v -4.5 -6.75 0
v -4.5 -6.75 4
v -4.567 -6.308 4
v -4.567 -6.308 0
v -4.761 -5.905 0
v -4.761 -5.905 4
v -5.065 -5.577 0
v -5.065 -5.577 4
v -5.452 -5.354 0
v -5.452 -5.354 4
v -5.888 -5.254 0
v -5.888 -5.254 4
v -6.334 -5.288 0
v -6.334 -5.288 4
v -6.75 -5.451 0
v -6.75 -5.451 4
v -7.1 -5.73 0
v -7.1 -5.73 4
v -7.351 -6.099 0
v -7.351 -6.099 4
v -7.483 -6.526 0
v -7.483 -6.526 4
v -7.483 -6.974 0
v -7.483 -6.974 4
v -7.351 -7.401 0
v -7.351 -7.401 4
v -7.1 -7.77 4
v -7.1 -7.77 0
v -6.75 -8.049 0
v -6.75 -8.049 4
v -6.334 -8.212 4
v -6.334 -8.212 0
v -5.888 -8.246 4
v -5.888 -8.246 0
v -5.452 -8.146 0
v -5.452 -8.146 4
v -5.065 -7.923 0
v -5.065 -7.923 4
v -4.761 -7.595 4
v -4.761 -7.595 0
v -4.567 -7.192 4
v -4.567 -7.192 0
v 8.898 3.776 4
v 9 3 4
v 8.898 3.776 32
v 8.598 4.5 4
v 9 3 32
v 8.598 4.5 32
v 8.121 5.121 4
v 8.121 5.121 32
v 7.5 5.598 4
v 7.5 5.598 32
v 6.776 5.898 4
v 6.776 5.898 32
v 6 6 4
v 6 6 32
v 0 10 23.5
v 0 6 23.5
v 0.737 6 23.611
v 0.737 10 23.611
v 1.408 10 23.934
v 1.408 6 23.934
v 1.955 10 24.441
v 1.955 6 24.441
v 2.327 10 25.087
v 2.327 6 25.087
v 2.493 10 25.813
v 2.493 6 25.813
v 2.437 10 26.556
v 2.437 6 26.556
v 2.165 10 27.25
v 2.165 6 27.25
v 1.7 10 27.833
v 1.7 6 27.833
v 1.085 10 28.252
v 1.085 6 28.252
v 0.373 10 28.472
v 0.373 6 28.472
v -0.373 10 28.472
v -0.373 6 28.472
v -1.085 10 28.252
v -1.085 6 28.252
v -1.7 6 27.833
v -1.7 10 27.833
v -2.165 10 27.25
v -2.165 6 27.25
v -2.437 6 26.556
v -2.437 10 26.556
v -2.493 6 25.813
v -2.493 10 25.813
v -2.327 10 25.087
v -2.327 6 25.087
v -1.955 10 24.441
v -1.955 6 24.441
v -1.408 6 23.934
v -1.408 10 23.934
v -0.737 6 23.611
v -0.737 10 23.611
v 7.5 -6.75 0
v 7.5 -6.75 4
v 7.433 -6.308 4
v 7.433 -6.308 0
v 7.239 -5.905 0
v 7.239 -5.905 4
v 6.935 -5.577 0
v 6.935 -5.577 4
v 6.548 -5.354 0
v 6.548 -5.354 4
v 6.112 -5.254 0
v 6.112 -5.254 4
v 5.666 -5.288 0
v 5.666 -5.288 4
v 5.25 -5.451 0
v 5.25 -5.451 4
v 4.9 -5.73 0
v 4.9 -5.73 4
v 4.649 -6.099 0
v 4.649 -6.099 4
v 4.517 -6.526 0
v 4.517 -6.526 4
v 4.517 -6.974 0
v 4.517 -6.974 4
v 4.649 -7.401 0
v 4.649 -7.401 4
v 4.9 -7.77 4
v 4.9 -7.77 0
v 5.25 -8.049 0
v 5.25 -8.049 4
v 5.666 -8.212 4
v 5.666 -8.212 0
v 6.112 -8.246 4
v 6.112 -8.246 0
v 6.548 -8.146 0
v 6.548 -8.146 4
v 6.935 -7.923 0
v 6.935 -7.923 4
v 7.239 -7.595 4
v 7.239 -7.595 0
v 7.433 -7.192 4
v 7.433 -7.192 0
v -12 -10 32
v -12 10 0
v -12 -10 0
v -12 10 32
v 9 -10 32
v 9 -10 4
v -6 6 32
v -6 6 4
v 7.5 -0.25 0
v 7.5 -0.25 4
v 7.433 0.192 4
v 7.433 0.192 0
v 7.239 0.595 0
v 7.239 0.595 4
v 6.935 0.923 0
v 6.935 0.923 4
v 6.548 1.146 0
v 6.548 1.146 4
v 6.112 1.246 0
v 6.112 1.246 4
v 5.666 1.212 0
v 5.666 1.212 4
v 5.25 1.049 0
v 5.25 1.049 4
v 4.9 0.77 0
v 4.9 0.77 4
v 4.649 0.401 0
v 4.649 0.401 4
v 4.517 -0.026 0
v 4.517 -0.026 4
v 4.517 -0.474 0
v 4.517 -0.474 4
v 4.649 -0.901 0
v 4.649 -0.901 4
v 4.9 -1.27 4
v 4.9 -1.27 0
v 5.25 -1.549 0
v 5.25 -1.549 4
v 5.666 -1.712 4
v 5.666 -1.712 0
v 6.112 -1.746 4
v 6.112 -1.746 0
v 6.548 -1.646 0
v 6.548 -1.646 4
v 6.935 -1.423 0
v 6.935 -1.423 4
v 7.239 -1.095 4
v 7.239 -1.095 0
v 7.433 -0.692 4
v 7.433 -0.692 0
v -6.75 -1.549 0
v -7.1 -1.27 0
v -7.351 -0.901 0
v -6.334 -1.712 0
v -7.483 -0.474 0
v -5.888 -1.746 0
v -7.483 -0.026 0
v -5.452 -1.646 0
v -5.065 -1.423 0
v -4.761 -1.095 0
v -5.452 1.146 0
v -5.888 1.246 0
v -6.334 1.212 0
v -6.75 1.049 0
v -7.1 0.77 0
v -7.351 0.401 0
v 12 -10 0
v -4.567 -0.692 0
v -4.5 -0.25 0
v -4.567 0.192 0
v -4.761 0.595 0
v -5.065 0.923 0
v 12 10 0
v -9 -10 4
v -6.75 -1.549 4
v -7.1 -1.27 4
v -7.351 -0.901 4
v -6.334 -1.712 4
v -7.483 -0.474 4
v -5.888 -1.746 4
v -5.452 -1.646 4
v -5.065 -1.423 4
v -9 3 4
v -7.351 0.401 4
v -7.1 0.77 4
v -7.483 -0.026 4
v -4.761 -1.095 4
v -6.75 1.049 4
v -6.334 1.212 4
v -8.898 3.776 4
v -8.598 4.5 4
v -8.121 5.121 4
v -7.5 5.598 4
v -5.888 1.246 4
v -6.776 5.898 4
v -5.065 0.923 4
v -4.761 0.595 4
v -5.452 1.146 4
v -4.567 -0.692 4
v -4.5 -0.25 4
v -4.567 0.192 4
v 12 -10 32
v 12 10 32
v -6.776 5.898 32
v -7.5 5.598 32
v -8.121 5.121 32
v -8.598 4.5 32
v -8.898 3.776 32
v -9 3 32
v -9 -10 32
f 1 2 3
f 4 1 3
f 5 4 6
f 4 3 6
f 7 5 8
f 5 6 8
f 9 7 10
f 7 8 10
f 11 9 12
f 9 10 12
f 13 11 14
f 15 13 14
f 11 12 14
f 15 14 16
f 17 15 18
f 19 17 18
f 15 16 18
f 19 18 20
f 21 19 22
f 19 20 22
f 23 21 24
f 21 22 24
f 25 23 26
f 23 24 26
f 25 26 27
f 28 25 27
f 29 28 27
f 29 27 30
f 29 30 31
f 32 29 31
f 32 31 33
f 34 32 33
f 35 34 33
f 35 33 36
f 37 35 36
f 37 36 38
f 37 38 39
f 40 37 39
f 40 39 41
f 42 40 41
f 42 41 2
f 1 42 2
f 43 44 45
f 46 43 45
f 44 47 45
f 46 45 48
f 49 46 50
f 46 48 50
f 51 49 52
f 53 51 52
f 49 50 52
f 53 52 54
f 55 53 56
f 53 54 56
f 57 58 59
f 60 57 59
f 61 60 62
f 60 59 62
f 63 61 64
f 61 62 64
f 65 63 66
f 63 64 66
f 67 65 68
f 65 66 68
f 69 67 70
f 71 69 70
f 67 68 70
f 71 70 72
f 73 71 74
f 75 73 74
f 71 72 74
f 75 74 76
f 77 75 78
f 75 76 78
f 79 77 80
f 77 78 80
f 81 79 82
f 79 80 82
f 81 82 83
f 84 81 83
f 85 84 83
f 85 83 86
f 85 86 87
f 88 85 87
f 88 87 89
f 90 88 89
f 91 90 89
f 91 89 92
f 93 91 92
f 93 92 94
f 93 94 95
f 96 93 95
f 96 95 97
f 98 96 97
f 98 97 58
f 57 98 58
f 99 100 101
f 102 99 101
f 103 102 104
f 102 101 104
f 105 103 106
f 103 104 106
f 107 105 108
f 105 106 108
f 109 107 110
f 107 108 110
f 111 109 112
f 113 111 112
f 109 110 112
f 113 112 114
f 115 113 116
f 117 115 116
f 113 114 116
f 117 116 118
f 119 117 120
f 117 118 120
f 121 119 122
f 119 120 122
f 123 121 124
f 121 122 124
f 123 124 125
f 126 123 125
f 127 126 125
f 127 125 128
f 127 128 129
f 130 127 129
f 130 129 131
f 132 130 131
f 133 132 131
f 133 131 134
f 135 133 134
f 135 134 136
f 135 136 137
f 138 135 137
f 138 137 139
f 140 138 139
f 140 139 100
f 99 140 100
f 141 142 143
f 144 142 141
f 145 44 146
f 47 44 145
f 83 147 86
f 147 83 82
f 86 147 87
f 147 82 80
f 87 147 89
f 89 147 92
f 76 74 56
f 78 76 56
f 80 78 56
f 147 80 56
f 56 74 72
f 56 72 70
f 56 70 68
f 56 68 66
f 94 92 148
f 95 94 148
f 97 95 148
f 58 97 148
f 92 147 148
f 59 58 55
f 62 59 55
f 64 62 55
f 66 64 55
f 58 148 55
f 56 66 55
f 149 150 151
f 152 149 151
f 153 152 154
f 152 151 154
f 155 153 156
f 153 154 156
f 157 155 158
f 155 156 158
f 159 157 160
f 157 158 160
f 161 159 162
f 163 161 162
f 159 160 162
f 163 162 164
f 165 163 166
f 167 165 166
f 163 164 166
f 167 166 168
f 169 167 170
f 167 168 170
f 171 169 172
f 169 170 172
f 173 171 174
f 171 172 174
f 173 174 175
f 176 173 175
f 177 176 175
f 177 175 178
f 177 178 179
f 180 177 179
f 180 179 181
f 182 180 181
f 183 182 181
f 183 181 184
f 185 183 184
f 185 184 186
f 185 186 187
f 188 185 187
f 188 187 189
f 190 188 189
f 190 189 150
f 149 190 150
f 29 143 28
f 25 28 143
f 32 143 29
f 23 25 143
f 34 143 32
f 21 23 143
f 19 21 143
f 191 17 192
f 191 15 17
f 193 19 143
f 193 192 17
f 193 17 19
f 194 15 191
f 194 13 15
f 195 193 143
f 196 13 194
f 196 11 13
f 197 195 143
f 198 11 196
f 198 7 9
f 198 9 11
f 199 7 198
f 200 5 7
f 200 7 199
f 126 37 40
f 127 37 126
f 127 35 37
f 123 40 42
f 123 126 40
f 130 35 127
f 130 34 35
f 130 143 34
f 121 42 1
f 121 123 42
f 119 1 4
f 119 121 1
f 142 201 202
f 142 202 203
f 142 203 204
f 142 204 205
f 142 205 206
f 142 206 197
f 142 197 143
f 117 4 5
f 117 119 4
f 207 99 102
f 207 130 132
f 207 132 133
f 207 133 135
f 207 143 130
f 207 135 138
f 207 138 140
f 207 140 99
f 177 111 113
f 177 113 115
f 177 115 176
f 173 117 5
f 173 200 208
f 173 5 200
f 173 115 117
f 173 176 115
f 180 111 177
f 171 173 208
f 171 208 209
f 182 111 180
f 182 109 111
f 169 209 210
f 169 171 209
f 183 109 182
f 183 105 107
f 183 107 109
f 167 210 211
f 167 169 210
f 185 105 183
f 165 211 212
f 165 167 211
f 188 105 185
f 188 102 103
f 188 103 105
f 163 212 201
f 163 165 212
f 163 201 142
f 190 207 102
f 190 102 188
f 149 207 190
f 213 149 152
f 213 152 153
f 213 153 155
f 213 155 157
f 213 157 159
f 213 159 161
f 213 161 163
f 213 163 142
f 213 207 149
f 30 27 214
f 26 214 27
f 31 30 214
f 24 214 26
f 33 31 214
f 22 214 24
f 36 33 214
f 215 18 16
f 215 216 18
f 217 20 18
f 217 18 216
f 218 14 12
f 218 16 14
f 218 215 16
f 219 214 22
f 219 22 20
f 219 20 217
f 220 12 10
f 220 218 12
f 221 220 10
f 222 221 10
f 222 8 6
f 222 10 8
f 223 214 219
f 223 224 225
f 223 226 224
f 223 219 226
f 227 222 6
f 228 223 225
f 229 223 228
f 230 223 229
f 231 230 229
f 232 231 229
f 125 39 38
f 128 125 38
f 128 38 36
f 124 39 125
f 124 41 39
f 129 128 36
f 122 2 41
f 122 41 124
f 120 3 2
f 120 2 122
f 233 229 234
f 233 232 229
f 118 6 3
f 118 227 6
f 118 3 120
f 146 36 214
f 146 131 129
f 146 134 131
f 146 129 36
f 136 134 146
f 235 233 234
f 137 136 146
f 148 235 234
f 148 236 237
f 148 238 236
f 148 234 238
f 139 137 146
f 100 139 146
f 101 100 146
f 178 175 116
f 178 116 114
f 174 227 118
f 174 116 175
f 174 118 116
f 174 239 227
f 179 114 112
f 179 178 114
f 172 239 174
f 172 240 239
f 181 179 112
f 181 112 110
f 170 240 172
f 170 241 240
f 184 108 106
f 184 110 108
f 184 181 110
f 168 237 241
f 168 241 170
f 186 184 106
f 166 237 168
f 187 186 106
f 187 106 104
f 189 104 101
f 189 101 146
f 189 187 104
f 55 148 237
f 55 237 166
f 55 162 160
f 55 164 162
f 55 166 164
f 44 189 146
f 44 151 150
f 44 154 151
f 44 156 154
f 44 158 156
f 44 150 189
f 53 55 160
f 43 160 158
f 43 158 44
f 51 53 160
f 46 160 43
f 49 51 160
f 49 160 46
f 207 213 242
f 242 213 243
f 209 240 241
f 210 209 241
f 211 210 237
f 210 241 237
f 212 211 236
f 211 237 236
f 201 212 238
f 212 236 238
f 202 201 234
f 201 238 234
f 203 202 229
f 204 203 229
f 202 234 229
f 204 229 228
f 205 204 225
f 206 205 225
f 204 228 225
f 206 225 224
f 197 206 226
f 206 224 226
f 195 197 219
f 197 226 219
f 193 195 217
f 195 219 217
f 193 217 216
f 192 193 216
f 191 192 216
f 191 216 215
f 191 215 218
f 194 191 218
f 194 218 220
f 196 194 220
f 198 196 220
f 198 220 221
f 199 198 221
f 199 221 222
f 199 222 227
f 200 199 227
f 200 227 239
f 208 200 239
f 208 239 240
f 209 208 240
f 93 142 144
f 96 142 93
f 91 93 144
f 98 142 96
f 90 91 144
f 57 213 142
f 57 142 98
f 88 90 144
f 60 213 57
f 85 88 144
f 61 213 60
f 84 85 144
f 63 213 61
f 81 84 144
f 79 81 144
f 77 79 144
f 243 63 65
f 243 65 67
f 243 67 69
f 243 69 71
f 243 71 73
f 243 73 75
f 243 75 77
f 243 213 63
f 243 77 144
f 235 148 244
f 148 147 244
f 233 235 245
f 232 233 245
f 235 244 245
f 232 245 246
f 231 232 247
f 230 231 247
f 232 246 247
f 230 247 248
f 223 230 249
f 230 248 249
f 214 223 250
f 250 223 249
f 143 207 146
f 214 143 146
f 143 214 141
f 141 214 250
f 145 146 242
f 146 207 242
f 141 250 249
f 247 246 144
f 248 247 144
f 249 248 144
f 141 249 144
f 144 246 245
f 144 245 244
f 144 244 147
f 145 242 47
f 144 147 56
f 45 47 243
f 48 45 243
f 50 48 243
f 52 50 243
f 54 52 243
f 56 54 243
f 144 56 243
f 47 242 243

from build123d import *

# Parameters (mm, degrees)
SKETCH_1_W          = 18
SKETCH_1_H          = 20
EXTRUDE_1_DEPTH     = 4
SKETCH_2_W          = 18
SKETCH_2_H          = 4
EXTRUDE_2_DEPTH     = 28
SKETCH_3_R          = 2.5
CUT_EXTRUDE_1_DEPTH = 37.891733491
SKETCH_4_R          = 1.5
CUT_EXTRUDE_2_DEPTH = 32
EXTRUDE_3_DEPTH     = 3
EXTRUDE_4_DEPTH     = 3
EXTRUDE_5_DEPTH     = 3
EXTRUDE_6_DEPTH     = 3
FILLET_1_R          = 3


with BuildPart() as part:
    # 草图1 → 凸台-拉伸1 (new body)
    with BuildSketch(Plane.XY):
        Rectangle(SKETCH_1_W, SKETCH_1_H)
    extrude(amount=EXTRUDE_1_DEPTH)

    # 草图2 → 凸台-拉伸2 (add)
    with BuildSketch(Plane.XY.offset(4)):
        with Locations((0, 8)):
            Rectangle(SKETCH_2_W, SKETCH_2_H)
    extrude(amount=EXTRUDE_2_DEPTH)

    # 草图3 → 切除-拉伸1 (cut, through all)
    with BuildSketch(Plane.XZ.offset(-6)):
        with Locations(Location((0, 26, 0), (0, 0, 270))):
            Circle(SKETCH_3_R)
    extrude(amount=-CUT_EXTRUDE_1_DEPTH, mode=Mode.SUBTRACT)

    # 草图4 → 切除-拉伸2 (cut)
    with BuildSketch(Plane.XY.offset(4)):
        with Locations((-6, -0.25)):
            Circle(SKETCH_4_R)
        with Locations((-6, -6.75)):
            Circle(SKETCH_4_R)
        with Locations((6, -0.25)):
            Circle(SKETCH_4_R)
        with Locations((6, -6.75)):
            Circle(SKETCH_4_R)
    extrude(amount=-CUT_EXTRUDE_2_DEPTH, mode=Mode.SUBTRACT)

    # 草图5 → 凸台-拉伸3 (add)
    with BuildSketch(Plane(origin=(9, 0, 0), x_dir=(0, 0, -1), z_dir=(1, 0, 0))):
        Polygon((-32, 10), (0, 10), (0, -10), (-4, -10), (-32, 6), align=None)
    extrude(amount=EXTRUDE_3_DEPTH)

    # 草图6 → 凸台-拉伸4 (add)
    with BuildSketch(Plane.ZY.offset(9)):
        Polygon((0, -10), (0, 10), (32, 10), (32, 6), (4, -10), align=None)
    extrude(amount=EXTRUDE_4_DEPTH)

    # 草图7 → 凸台-拉伸5 (add)
    with BuildSketch(Plane.ZY.offset(12)):
        Polygon((32, 6), (4, -10), (32, -10), align=None)
    extrude(amount=-EXTRUDE_5_DEPTH)

    # 草图8 → 凸台-拉伸6 (add)
    with BuildSketch(Plane(origin=(12, 0, 0), x_dir=(0, 0, -1), z_dir=(1, 0, 0))):
        Polygon((-32, 6), (-4, -10), (-32, -10), align=None)
    extrude(amount=-EXTRUDE_6_DEPTH)

    # 圆角1
    fillet_1_edges = [part.edges().sort_by_distance(p)[0] for p in [
        (-9, 6, 18),
        (9, 6, 18),
    ]]
    fillet(fillet_1_edges, radius=FILLET_1_R)


solid = part.part
